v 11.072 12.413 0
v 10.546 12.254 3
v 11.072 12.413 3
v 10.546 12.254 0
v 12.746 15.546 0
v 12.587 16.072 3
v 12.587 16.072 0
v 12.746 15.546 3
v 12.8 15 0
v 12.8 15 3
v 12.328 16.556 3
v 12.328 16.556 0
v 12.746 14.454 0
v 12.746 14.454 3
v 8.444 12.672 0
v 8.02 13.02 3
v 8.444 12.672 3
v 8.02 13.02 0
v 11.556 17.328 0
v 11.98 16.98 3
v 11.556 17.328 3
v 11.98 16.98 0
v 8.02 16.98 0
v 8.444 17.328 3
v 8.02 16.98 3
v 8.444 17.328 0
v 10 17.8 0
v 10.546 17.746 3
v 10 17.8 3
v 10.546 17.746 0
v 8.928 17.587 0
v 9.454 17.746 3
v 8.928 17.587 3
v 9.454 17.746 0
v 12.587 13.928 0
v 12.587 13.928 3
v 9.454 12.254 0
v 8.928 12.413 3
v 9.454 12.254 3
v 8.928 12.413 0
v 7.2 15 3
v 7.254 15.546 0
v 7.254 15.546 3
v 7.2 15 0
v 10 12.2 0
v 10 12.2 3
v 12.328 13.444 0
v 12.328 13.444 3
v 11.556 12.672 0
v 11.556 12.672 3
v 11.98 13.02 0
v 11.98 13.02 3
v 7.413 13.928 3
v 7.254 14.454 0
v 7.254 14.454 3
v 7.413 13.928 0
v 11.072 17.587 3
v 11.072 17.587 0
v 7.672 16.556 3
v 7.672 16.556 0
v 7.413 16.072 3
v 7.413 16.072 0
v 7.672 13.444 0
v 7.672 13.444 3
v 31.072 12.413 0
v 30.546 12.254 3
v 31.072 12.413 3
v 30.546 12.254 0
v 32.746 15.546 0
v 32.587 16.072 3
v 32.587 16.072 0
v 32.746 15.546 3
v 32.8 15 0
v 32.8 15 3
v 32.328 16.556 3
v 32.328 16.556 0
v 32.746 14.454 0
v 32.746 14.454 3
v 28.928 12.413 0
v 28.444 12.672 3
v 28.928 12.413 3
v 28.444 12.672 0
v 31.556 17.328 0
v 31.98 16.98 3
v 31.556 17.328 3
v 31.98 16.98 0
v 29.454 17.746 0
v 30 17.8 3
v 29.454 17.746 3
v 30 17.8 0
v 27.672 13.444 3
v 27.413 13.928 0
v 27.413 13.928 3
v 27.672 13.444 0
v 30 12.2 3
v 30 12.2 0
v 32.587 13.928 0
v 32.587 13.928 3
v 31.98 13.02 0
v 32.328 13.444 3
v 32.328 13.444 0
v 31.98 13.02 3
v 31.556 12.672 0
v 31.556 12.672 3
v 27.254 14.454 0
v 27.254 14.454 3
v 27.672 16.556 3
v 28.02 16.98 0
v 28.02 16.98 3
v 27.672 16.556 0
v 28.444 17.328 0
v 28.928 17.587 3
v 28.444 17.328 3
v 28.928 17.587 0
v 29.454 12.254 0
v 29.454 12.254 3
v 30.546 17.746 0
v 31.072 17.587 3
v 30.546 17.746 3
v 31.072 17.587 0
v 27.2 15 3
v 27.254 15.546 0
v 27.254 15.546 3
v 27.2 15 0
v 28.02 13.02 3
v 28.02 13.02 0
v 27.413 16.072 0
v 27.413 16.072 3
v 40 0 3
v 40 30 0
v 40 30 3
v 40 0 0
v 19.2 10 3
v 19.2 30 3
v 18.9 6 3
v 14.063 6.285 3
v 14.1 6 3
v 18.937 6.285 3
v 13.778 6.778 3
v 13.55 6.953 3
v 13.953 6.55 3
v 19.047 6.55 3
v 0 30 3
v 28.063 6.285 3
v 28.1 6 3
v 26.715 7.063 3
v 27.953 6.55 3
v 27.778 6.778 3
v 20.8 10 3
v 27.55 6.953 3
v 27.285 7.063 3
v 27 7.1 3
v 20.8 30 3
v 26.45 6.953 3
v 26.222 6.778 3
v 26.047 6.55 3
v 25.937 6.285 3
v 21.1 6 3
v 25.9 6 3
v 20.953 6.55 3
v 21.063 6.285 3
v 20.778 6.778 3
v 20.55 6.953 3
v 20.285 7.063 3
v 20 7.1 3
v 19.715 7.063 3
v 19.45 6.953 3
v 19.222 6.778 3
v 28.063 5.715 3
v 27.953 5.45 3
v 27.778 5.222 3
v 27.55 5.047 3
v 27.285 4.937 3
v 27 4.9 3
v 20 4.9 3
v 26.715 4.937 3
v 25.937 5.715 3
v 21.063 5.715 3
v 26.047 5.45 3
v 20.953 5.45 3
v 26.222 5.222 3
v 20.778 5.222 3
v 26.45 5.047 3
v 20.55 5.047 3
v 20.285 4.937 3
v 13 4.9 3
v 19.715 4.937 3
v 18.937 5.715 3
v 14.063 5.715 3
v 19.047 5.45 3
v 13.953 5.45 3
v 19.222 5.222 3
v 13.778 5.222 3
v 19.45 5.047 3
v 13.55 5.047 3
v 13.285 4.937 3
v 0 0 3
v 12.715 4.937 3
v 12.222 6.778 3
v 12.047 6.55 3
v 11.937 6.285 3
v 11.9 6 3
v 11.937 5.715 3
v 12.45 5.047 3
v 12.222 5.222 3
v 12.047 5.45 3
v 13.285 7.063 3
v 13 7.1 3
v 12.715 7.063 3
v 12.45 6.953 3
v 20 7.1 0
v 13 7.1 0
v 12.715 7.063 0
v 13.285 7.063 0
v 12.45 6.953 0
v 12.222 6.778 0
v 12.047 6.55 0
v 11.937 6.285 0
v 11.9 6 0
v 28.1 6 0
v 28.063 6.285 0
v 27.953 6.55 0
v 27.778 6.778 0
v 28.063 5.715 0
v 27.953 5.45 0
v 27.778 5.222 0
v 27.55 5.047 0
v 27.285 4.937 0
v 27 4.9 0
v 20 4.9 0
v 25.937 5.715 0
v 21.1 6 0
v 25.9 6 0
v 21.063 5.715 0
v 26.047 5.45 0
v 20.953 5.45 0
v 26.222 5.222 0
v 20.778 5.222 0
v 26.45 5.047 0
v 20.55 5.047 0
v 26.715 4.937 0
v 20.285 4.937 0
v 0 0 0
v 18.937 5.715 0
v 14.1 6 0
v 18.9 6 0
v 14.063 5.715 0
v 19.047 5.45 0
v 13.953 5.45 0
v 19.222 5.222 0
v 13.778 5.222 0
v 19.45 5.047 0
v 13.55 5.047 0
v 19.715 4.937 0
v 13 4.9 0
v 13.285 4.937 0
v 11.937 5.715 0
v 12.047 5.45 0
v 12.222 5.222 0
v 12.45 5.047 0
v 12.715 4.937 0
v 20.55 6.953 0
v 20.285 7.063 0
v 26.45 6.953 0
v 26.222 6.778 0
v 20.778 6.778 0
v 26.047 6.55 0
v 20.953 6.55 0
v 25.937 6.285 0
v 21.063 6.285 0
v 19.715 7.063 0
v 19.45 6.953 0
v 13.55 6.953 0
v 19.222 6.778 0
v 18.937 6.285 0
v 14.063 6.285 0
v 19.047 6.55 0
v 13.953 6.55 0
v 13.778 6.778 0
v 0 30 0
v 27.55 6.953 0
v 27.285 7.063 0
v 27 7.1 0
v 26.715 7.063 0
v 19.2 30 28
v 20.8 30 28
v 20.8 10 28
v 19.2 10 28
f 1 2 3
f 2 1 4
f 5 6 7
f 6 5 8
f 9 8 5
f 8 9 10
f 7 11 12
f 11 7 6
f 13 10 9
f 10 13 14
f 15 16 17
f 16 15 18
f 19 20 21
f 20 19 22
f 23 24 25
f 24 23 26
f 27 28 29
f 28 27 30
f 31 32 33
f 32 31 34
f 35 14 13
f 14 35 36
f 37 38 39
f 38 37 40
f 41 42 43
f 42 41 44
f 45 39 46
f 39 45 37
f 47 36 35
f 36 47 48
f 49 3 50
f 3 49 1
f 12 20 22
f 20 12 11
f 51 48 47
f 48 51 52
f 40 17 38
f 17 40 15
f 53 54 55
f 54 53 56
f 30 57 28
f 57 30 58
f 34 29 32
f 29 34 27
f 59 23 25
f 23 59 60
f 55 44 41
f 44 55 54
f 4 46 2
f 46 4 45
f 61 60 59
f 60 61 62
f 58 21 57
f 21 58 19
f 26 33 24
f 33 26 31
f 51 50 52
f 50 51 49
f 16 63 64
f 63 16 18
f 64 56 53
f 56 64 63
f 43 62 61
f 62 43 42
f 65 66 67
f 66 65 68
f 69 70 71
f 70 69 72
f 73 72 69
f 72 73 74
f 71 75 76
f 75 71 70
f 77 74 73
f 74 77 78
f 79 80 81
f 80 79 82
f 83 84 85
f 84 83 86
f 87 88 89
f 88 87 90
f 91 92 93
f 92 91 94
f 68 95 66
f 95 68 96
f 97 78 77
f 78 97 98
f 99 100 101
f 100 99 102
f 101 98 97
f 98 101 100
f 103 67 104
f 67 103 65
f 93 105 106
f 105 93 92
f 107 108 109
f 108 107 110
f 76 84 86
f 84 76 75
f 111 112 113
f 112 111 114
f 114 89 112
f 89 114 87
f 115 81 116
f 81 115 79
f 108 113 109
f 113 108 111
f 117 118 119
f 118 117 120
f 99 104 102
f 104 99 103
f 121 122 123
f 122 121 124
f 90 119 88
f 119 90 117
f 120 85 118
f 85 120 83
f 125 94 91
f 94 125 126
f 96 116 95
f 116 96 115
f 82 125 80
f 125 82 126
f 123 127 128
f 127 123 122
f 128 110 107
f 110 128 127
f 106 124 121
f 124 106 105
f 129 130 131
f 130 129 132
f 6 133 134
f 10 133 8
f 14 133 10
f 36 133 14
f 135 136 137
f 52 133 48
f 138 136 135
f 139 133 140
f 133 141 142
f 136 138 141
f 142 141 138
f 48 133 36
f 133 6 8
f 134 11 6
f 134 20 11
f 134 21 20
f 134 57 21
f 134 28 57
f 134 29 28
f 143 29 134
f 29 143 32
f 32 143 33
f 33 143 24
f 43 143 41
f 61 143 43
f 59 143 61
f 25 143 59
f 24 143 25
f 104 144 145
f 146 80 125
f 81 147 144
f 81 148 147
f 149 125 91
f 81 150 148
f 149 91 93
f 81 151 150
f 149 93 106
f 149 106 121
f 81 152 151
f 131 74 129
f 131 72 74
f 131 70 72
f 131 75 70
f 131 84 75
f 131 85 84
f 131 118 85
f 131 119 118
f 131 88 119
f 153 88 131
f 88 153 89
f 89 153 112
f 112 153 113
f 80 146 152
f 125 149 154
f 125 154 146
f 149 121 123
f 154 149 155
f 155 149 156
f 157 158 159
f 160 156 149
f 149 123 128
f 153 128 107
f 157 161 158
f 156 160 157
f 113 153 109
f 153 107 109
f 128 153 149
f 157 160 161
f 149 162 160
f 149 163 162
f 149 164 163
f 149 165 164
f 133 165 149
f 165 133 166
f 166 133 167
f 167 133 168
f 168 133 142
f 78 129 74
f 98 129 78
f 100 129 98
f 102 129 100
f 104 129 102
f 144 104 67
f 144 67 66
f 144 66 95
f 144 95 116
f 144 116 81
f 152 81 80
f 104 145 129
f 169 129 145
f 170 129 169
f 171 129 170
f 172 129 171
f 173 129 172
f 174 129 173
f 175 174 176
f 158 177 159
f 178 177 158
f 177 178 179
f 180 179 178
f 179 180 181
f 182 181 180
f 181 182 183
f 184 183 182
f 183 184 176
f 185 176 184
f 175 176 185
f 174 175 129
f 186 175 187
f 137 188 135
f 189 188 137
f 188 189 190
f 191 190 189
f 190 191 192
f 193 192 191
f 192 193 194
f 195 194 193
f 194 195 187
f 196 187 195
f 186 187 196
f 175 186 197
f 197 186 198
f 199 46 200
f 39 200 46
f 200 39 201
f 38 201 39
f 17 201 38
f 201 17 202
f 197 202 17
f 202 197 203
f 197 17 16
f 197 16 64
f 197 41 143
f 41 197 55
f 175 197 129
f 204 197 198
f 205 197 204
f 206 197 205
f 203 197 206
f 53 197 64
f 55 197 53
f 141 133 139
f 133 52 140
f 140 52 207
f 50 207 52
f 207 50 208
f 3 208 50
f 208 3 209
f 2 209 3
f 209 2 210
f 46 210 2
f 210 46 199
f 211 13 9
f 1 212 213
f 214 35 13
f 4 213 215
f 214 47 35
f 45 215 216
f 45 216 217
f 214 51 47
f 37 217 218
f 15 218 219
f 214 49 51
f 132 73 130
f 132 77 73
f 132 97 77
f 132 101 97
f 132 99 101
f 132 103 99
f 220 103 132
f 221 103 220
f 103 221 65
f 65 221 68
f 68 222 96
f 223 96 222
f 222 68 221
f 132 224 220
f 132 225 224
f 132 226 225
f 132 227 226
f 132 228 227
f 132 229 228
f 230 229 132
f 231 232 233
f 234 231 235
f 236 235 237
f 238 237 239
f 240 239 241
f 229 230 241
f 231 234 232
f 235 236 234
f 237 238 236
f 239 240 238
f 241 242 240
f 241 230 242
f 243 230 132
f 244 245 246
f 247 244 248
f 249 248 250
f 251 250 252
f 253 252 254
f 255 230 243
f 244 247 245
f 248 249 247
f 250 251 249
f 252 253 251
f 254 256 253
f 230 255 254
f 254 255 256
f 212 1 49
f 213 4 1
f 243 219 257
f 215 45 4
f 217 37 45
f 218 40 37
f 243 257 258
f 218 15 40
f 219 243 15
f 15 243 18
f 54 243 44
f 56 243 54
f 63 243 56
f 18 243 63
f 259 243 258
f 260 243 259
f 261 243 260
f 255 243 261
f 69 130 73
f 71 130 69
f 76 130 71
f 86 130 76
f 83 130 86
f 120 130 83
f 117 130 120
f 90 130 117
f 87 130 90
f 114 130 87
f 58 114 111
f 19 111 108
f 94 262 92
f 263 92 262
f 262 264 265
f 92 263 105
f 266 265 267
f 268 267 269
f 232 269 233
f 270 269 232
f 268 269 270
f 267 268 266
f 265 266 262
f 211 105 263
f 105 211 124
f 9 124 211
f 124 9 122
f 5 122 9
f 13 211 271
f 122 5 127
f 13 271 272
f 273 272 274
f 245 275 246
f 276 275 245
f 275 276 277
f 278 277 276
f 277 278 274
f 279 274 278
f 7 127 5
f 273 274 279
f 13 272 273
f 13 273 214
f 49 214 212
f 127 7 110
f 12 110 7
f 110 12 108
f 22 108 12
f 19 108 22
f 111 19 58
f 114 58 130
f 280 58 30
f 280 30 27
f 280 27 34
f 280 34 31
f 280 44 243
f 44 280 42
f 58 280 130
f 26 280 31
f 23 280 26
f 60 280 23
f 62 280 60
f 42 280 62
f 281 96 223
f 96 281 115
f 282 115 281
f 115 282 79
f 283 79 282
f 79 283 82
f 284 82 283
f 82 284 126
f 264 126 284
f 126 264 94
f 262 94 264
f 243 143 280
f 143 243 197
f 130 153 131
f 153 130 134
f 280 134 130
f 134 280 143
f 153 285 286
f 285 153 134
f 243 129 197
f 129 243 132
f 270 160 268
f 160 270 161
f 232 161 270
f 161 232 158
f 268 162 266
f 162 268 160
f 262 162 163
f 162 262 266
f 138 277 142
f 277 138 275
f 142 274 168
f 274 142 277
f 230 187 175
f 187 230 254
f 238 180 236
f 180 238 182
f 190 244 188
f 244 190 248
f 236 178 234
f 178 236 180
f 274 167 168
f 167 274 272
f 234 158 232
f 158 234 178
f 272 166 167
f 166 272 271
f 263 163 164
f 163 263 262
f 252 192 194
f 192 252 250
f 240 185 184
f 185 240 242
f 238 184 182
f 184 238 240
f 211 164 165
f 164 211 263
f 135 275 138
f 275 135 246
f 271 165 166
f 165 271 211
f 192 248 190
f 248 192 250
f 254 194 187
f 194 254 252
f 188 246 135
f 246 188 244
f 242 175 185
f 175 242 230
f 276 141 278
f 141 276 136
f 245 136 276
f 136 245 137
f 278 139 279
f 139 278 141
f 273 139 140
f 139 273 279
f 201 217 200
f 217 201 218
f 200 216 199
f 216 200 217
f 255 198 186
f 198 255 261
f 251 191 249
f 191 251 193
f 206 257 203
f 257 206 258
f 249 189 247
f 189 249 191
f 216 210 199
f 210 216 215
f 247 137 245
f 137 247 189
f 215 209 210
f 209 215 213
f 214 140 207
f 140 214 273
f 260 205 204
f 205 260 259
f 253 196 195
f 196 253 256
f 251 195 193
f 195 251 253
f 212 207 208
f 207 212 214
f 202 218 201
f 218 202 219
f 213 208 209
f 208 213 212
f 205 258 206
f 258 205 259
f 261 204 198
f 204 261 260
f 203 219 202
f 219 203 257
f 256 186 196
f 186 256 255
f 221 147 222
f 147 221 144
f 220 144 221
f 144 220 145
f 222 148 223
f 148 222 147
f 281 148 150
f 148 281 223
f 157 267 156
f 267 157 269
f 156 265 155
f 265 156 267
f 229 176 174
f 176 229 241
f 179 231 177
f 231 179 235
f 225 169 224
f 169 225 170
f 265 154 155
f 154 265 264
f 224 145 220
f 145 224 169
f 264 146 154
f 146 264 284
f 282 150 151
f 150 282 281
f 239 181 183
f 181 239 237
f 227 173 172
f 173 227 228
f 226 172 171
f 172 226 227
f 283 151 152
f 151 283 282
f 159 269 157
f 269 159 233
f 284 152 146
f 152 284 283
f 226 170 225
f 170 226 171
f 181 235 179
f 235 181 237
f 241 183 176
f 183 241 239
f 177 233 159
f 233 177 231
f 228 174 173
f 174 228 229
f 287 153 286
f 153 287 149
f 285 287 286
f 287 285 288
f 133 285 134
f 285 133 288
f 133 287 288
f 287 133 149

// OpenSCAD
// OPENLAB — LDR light tracker: servo horn bracket with two LDR pockets and a shade fin
// License: CC BY-SA 4.0. Units: mm. Prints flat, no supports.
// The fin between the two LDRs casts a shadow on one sensor when the light is off-axis,
// which is what makes the tracking differential work.

plate_w = 40; plate_l = 30; plate_t = 3;
ldr_d   = 5.6;          // GL5528 body ~5 mm
ldr_gap = 20;           // centre-to-centre
fin_h   = 25; fin_t = 1.6;
horn_hole_d = 2.2;      // SG90 horn screw

difference() {
  cube([plate_w, plate_l, plate_t]);
  for (x = [plate_w/2 - ldr_gap/2, plate_w/2 + ldr_gap/2])
    translate([x, plate_l/2, -1]) cylinder(d = ldr_d, h = plate_t + 2, $fn = 32);
  // servo horn mounting: centre + two 7 mm offset holes match the SG90 single-arm horn
  translate([plate_w/2, 6, -1]) cylinder(d = horn_hole_d, h = 5, $fn = 24);
  translate([plate_w/2 - 7, 6, -1]) cylinder(d = horn_hole_d, h = 5, $fn = 24);
  translate([plate_w/2 + 7, 6, -1]) cylinder(d = horn_hole_d, h = 5, $fn = 24);
}
// shade fin
translate([plate_w/2 - fin_t/2, 10, plate_t]) cube([fin_t, plate_l - 10, fin_h]);
